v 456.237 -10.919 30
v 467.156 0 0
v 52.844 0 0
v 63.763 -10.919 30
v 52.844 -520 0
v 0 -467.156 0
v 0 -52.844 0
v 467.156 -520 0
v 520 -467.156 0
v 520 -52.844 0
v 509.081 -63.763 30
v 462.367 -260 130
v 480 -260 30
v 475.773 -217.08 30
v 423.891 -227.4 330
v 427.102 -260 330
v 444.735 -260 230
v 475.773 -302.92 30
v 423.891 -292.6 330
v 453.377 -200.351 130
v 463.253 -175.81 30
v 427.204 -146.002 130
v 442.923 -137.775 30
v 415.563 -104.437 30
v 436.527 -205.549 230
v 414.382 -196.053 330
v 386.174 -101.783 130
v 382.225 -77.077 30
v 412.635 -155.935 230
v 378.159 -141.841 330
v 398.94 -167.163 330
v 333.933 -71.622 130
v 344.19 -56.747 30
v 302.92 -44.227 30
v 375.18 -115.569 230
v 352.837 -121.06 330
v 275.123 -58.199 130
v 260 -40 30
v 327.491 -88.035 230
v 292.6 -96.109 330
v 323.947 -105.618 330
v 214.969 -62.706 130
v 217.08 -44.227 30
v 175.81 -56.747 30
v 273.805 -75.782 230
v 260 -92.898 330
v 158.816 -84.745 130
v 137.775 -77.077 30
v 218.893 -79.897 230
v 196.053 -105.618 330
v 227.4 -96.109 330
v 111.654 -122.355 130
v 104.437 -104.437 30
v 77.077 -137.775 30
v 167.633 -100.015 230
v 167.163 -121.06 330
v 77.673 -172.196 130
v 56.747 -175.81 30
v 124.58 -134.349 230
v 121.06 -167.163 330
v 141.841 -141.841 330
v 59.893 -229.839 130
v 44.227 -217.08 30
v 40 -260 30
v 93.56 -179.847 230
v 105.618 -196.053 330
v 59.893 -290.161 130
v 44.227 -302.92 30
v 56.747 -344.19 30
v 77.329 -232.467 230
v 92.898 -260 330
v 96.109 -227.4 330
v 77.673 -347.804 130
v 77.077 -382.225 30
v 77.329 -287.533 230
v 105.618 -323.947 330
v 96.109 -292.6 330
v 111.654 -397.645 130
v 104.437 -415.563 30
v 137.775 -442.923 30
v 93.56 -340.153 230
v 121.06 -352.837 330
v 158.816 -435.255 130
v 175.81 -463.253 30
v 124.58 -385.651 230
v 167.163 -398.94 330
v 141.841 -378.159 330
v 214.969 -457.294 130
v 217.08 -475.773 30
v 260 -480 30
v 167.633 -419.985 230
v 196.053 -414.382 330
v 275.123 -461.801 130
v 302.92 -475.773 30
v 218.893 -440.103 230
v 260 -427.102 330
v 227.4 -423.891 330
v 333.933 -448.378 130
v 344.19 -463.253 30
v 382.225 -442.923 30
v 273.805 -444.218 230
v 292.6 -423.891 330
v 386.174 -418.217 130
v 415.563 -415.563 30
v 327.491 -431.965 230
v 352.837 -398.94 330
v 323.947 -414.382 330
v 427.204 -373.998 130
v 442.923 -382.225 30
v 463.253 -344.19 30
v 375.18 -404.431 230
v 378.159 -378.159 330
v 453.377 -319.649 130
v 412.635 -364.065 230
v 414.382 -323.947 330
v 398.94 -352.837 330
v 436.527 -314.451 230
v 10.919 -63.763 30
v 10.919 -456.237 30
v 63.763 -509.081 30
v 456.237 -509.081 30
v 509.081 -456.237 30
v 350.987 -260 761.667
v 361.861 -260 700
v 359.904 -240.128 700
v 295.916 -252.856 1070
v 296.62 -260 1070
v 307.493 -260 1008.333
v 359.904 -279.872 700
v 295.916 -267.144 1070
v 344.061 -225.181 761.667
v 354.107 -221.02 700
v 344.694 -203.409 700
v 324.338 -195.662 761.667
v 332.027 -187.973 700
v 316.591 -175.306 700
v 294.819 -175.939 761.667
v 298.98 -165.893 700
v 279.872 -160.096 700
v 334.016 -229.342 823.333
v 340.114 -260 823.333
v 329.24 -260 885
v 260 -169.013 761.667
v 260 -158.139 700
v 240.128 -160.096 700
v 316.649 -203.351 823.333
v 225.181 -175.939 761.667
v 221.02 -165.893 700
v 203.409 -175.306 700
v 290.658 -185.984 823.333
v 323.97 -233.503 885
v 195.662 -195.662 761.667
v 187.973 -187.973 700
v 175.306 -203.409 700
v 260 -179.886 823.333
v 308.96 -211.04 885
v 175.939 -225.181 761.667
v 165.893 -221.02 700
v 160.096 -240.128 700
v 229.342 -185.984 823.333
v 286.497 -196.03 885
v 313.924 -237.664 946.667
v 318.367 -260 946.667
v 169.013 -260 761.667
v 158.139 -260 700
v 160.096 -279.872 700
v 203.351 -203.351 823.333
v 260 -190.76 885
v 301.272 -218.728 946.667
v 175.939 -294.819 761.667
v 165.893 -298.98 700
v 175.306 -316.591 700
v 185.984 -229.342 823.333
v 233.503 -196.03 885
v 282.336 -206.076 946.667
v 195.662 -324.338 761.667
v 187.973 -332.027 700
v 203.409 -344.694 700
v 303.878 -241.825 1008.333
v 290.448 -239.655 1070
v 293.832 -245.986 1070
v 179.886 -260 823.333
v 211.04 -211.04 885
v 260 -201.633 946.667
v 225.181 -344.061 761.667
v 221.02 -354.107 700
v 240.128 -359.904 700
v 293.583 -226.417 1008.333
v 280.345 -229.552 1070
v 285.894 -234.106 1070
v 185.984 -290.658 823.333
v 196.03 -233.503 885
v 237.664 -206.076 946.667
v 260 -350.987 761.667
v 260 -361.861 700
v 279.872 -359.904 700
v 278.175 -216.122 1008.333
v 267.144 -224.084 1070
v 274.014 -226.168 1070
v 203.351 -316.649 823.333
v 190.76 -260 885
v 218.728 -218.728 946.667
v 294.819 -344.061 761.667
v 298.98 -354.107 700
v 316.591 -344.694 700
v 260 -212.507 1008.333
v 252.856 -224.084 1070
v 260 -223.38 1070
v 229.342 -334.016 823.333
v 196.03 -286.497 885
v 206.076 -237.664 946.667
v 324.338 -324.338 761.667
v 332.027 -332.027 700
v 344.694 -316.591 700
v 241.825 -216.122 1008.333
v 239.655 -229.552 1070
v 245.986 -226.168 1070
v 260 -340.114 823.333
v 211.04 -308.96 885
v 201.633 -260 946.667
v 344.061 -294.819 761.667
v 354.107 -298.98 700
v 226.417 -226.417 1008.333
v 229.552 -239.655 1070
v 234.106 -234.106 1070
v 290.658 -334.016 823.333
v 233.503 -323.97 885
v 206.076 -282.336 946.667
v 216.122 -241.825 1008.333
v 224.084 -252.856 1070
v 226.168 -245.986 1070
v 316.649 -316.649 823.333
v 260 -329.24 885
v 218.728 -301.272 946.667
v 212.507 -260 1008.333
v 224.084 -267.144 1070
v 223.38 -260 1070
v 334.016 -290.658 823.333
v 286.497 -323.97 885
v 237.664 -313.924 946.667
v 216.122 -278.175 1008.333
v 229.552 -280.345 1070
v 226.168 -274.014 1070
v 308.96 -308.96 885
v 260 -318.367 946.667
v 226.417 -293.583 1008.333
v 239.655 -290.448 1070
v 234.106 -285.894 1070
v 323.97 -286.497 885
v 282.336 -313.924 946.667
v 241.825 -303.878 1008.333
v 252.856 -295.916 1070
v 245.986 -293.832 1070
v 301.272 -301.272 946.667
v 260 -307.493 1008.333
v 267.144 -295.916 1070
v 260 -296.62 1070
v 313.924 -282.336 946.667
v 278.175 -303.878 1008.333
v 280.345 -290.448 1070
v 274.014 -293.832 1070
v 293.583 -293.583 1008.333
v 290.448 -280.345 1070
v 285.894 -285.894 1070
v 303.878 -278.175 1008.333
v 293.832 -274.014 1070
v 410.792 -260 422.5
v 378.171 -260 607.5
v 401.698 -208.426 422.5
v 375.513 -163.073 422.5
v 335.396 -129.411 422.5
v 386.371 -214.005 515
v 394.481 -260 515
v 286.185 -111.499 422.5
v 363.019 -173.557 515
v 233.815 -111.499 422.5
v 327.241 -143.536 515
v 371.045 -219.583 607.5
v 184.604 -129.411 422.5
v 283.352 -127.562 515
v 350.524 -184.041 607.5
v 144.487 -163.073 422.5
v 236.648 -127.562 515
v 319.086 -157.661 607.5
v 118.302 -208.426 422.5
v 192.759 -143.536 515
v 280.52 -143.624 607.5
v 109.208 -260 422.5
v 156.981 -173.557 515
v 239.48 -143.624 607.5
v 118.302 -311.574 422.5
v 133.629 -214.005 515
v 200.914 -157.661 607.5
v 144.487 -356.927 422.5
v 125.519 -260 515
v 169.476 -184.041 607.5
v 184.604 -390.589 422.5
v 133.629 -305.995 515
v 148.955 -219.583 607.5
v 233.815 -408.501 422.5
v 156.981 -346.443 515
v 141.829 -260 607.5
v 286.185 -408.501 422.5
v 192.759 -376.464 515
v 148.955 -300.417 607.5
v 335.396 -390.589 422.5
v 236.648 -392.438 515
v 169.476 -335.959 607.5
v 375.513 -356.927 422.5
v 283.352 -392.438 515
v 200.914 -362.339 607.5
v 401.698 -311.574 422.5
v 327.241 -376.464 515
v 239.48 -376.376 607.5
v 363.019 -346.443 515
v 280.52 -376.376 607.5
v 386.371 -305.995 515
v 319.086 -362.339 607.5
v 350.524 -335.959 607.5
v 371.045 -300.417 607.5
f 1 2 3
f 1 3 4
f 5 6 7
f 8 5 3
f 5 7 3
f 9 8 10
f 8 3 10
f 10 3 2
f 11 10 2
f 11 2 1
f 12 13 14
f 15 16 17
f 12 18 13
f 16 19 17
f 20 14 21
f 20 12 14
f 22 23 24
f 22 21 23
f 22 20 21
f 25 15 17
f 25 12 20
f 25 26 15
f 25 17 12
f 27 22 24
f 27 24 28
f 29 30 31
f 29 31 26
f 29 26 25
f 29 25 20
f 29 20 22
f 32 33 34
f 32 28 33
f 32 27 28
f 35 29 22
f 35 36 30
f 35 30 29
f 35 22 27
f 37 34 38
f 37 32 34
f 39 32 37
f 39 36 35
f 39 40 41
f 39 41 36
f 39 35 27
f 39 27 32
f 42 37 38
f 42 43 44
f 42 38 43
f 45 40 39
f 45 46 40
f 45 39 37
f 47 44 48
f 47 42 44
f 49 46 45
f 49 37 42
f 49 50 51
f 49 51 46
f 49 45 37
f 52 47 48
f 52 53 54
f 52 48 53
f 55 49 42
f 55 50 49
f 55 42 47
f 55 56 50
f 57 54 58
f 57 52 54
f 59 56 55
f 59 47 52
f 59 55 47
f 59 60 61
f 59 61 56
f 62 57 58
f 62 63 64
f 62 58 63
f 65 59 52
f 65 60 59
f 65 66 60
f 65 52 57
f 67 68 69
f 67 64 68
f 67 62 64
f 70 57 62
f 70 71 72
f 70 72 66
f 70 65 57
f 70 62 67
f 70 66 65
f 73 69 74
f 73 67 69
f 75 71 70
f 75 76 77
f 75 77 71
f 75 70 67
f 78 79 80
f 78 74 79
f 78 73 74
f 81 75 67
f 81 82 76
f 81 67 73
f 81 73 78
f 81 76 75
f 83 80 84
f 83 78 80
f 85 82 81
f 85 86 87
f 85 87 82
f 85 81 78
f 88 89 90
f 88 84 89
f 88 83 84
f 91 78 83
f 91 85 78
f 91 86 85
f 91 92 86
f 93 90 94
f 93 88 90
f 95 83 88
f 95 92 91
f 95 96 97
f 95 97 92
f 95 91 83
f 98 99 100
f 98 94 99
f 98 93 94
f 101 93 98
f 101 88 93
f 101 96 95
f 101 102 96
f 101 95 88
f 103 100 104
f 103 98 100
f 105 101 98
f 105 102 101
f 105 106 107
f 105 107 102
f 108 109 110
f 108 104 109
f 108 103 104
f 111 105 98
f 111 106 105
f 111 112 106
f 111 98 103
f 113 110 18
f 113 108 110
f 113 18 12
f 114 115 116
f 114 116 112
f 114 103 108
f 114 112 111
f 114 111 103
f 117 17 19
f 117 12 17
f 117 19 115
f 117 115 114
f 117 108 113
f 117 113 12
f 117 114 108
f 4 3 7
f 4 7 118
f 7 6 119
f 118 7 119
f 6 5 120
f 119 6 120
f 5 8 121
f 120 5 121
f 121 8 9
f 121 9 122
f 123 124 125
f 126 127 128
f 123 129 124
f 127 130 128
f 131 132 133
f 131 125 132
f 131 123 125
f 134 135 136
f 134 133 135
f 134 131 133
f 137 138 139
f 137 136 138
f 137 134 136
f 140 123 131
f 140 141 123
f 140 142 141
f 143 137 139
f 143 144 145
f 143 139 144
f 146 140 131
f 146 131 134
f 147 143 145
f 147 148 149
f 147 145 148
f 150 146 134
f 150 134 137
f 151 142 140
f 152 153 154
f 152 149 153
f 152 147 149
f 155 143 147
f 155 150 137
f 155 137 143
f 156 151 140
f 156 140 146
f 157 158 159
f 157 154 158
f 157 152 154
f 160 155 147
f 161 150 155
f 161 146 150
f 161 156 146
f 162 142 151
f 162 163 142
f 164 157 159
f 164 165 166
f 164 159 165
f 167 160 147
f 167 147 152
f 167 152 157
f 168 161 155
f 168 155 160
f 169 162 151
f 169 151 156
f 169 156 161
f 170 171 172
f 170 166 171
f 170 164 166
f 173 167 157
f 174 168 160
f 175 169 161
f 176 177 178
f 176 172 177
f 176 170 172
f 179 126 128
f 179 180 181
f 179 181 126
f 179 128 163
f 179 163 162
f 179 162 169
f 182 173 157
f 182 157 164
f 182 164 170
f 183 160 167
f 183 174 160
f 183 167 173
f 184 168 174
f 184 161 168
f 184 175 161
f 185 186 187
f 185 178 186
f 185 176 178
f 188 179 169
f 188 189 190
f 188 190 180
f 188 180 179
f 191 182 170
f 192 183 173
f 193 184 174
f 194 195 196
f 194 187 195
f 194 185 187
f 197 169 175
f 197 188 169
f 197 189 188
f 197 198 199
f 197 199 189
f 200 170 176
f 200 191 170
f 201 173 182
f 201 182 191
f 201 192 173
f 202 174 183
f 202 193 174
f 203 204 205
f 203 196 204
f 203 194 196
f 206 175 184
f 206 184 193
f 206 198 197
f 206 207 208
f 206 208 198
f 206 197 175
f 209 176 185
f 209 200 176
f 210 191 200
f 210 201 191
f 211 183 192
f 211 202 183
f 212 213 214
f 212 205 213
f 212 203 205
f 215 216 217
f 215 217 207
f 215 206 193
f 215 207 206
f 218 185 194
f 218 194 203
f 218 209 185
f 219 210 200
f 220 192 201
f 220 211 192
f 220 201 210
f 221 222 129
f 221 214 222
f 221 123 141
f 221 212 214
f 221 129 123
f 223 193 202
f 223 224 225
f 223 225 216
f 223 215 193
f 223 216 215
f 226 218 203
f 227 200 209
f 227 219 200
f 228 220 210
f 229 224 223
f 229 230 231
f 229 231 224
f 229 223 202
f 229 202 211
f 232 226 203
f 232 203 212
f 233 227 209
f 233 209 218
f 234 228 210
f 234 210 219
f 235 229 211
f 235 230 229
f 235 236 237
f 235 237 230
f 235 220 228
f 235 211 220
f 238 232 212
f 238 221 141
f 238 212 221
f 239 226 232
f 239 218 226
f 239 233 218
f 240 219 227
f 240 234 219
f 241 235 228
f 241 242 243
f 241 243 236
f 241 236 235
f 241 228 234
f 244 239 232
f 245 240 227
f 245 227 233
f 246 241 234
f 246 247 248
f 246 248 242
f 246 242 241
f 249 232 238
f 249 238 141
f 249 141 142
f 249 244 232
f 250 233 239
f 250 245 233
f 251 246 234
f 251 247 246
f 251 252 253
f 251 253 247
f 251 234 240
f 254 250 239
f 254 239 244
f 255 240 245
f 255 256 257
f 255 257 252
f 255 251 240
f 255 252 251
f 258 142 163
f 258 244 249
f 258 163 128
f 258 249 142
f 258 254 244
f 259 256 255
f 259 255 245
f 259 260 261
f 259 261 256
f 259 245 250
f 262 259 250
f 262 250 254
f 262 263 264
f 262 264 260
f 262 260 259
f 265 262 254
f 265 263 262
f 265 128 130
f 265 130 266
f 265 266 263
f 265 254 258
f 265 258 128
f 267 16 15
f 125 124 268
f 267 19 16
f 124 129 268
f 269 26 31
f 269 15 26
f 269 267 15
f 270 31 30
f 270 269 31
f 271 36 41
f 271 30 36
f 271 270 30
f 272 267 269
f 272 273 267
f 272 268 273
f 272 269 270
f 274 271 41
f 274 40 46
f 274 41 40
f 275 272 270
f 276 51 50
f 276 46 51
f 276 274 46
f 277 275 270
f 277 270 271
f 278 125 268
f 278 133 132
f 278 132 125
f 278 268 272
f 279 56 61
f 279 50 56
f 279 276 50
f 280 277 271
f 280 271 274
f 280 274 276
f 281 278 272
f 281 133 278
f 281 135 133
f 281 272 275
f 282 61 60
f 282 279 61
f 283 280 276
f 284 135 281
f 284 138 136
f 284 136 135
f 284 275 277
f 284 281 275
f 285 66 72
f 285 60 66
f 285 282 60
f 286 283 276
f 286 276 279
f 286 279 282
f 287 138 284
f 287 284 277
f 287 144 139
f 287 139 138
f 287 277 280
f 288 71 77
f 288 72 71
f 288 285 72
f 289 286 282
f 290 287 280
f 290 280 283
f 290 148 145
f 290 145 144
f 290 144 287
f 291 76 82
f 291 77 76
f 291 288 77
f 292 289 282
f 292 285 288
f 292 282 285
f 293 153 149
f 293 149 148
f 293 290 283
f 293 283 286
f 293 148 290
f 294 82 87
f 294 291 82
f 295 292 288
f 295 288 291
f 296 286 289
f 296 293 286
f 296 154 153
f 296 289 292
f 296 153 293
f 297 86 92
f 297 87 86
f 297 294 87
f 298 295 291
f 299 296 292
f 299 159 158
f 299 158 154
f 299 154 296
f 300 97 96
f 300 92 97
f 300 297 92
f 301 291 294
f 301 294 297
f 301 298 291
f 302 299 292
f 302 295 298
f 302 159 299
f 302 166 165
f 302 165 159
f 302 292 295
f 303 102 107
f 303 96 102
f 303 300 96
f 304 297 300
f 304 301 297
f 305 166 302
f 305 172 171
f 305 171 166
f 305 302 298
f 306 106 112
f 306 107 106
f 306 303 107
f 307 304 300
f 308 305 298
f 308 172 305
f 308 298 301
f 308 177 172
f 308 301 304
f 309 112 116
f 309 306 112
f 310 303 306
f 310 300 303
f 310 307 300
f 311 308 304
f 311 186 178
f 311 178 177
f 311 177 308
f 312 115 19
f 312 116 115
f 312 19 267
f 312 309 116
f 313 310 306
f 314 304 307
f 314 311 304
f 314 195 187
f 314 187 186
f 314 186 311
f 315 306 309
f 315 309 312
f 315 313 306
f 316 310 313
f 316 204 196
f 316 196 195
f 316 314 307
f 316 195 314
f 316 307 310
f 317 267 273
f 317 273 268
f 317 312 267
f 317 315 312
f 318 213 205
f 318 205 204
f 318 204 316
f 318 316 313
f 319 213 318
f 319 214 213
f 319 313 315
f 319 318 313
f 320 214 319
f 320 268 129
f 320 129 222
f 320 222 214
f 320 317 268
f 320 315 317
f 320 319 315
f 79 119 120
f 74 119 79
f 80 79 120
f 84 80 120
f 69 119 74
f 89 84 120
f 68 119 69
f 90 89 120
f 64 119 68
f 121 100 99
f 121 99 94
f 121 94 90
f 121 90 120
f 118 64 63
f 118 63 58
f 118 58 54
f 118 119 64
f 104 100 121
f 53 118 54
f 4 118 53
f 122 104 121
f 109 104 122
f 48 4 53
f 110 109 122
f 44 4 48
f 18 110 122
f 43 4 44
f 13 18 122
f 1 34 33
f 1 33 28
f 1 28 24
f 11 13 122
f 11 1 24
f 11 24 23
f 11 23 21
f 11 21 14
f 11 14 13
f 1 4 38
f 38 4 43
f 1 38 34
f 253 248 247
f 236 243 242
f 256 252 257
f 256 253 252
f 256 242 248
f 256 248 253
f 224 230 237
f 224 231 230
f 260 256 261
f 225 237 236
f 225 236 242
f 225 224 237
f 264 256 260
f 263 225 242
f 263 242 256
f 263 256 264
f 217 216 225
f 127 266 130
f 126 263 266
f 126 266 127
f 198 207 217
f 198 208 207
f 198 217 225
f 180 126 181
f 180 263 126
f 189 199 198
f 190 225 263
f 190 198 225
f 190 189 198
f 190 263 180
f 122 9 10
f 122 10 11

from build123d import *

# Parameters (mm, degrees)
SKETCH_W     = 520
SKETCH_H     = 520
PAD_DEPTH    = 30
PAD_TAPER    = 20
CHAMFER_SIZE = 50
SKETCH001_R  = 220
PAD001_DEPTH = 300
PAD001_TAPER = 10
SKETCH002_R  = 167.101906
PAD002_DEPTH = 370
PAD002_TAPER = 10
SKETCH003_R  = 101.860923
PAD003_DEPTH = 370
PAD003_TAPER = 10


with BuildPart() as part:
    # Sketch → Pad (new body)
    with BuildSketch(Plane.XY):
        with Locations((260, -260)):
            Rectangle(SKETCH_W, SKETCH_H)
    extrude(amount=PAD_DEPTH, taper=PAD_TAPER)

    # Chamfer
    chamfer_edges = [part.edges().sort_by_distance(p)[0] for p in [
        (514.540446, -514.540446, 15),
        (514.540446, -5.459554, 15),
        (5.459554, -514.540446, 15),
        (5.459554, -5.459554, 15),
    ]]
    chamfer(chamfer_edges, length=CHAMFER_SIZE)

    # Sketch001 (on Face5 of Chamfer) → Pad001 (join)
    with BuildSketch(Plane.XY.offset(30)):
        with Locations((260, -260)):
            Circle(SKETCH001_R)
    extrude(amount=PAD001_DEPTH, taper=PAD001_TAPER)

    # Sketch002 (on Face12 of Pad001) → Pad002 (join)
    with BuildSketch(Plane.XY.offset(330)):
        with Locations((260, -260)):
            Circle(SKETCH002_R)
    extrude(amount=PAD002_DEPTH, taper=PAD002_TAPER)

    # Sketch003 (on Face13 of Pad002) → Pad003 (join)
    with BuildSketch(Plane.XY.offset(700)):
        with Locations((260, -260)):
            Circle(SKETCH003_R)
    extrude(amount=PAD003_DEPTH, taper=PAD003_TAPER)


solid = part.part
